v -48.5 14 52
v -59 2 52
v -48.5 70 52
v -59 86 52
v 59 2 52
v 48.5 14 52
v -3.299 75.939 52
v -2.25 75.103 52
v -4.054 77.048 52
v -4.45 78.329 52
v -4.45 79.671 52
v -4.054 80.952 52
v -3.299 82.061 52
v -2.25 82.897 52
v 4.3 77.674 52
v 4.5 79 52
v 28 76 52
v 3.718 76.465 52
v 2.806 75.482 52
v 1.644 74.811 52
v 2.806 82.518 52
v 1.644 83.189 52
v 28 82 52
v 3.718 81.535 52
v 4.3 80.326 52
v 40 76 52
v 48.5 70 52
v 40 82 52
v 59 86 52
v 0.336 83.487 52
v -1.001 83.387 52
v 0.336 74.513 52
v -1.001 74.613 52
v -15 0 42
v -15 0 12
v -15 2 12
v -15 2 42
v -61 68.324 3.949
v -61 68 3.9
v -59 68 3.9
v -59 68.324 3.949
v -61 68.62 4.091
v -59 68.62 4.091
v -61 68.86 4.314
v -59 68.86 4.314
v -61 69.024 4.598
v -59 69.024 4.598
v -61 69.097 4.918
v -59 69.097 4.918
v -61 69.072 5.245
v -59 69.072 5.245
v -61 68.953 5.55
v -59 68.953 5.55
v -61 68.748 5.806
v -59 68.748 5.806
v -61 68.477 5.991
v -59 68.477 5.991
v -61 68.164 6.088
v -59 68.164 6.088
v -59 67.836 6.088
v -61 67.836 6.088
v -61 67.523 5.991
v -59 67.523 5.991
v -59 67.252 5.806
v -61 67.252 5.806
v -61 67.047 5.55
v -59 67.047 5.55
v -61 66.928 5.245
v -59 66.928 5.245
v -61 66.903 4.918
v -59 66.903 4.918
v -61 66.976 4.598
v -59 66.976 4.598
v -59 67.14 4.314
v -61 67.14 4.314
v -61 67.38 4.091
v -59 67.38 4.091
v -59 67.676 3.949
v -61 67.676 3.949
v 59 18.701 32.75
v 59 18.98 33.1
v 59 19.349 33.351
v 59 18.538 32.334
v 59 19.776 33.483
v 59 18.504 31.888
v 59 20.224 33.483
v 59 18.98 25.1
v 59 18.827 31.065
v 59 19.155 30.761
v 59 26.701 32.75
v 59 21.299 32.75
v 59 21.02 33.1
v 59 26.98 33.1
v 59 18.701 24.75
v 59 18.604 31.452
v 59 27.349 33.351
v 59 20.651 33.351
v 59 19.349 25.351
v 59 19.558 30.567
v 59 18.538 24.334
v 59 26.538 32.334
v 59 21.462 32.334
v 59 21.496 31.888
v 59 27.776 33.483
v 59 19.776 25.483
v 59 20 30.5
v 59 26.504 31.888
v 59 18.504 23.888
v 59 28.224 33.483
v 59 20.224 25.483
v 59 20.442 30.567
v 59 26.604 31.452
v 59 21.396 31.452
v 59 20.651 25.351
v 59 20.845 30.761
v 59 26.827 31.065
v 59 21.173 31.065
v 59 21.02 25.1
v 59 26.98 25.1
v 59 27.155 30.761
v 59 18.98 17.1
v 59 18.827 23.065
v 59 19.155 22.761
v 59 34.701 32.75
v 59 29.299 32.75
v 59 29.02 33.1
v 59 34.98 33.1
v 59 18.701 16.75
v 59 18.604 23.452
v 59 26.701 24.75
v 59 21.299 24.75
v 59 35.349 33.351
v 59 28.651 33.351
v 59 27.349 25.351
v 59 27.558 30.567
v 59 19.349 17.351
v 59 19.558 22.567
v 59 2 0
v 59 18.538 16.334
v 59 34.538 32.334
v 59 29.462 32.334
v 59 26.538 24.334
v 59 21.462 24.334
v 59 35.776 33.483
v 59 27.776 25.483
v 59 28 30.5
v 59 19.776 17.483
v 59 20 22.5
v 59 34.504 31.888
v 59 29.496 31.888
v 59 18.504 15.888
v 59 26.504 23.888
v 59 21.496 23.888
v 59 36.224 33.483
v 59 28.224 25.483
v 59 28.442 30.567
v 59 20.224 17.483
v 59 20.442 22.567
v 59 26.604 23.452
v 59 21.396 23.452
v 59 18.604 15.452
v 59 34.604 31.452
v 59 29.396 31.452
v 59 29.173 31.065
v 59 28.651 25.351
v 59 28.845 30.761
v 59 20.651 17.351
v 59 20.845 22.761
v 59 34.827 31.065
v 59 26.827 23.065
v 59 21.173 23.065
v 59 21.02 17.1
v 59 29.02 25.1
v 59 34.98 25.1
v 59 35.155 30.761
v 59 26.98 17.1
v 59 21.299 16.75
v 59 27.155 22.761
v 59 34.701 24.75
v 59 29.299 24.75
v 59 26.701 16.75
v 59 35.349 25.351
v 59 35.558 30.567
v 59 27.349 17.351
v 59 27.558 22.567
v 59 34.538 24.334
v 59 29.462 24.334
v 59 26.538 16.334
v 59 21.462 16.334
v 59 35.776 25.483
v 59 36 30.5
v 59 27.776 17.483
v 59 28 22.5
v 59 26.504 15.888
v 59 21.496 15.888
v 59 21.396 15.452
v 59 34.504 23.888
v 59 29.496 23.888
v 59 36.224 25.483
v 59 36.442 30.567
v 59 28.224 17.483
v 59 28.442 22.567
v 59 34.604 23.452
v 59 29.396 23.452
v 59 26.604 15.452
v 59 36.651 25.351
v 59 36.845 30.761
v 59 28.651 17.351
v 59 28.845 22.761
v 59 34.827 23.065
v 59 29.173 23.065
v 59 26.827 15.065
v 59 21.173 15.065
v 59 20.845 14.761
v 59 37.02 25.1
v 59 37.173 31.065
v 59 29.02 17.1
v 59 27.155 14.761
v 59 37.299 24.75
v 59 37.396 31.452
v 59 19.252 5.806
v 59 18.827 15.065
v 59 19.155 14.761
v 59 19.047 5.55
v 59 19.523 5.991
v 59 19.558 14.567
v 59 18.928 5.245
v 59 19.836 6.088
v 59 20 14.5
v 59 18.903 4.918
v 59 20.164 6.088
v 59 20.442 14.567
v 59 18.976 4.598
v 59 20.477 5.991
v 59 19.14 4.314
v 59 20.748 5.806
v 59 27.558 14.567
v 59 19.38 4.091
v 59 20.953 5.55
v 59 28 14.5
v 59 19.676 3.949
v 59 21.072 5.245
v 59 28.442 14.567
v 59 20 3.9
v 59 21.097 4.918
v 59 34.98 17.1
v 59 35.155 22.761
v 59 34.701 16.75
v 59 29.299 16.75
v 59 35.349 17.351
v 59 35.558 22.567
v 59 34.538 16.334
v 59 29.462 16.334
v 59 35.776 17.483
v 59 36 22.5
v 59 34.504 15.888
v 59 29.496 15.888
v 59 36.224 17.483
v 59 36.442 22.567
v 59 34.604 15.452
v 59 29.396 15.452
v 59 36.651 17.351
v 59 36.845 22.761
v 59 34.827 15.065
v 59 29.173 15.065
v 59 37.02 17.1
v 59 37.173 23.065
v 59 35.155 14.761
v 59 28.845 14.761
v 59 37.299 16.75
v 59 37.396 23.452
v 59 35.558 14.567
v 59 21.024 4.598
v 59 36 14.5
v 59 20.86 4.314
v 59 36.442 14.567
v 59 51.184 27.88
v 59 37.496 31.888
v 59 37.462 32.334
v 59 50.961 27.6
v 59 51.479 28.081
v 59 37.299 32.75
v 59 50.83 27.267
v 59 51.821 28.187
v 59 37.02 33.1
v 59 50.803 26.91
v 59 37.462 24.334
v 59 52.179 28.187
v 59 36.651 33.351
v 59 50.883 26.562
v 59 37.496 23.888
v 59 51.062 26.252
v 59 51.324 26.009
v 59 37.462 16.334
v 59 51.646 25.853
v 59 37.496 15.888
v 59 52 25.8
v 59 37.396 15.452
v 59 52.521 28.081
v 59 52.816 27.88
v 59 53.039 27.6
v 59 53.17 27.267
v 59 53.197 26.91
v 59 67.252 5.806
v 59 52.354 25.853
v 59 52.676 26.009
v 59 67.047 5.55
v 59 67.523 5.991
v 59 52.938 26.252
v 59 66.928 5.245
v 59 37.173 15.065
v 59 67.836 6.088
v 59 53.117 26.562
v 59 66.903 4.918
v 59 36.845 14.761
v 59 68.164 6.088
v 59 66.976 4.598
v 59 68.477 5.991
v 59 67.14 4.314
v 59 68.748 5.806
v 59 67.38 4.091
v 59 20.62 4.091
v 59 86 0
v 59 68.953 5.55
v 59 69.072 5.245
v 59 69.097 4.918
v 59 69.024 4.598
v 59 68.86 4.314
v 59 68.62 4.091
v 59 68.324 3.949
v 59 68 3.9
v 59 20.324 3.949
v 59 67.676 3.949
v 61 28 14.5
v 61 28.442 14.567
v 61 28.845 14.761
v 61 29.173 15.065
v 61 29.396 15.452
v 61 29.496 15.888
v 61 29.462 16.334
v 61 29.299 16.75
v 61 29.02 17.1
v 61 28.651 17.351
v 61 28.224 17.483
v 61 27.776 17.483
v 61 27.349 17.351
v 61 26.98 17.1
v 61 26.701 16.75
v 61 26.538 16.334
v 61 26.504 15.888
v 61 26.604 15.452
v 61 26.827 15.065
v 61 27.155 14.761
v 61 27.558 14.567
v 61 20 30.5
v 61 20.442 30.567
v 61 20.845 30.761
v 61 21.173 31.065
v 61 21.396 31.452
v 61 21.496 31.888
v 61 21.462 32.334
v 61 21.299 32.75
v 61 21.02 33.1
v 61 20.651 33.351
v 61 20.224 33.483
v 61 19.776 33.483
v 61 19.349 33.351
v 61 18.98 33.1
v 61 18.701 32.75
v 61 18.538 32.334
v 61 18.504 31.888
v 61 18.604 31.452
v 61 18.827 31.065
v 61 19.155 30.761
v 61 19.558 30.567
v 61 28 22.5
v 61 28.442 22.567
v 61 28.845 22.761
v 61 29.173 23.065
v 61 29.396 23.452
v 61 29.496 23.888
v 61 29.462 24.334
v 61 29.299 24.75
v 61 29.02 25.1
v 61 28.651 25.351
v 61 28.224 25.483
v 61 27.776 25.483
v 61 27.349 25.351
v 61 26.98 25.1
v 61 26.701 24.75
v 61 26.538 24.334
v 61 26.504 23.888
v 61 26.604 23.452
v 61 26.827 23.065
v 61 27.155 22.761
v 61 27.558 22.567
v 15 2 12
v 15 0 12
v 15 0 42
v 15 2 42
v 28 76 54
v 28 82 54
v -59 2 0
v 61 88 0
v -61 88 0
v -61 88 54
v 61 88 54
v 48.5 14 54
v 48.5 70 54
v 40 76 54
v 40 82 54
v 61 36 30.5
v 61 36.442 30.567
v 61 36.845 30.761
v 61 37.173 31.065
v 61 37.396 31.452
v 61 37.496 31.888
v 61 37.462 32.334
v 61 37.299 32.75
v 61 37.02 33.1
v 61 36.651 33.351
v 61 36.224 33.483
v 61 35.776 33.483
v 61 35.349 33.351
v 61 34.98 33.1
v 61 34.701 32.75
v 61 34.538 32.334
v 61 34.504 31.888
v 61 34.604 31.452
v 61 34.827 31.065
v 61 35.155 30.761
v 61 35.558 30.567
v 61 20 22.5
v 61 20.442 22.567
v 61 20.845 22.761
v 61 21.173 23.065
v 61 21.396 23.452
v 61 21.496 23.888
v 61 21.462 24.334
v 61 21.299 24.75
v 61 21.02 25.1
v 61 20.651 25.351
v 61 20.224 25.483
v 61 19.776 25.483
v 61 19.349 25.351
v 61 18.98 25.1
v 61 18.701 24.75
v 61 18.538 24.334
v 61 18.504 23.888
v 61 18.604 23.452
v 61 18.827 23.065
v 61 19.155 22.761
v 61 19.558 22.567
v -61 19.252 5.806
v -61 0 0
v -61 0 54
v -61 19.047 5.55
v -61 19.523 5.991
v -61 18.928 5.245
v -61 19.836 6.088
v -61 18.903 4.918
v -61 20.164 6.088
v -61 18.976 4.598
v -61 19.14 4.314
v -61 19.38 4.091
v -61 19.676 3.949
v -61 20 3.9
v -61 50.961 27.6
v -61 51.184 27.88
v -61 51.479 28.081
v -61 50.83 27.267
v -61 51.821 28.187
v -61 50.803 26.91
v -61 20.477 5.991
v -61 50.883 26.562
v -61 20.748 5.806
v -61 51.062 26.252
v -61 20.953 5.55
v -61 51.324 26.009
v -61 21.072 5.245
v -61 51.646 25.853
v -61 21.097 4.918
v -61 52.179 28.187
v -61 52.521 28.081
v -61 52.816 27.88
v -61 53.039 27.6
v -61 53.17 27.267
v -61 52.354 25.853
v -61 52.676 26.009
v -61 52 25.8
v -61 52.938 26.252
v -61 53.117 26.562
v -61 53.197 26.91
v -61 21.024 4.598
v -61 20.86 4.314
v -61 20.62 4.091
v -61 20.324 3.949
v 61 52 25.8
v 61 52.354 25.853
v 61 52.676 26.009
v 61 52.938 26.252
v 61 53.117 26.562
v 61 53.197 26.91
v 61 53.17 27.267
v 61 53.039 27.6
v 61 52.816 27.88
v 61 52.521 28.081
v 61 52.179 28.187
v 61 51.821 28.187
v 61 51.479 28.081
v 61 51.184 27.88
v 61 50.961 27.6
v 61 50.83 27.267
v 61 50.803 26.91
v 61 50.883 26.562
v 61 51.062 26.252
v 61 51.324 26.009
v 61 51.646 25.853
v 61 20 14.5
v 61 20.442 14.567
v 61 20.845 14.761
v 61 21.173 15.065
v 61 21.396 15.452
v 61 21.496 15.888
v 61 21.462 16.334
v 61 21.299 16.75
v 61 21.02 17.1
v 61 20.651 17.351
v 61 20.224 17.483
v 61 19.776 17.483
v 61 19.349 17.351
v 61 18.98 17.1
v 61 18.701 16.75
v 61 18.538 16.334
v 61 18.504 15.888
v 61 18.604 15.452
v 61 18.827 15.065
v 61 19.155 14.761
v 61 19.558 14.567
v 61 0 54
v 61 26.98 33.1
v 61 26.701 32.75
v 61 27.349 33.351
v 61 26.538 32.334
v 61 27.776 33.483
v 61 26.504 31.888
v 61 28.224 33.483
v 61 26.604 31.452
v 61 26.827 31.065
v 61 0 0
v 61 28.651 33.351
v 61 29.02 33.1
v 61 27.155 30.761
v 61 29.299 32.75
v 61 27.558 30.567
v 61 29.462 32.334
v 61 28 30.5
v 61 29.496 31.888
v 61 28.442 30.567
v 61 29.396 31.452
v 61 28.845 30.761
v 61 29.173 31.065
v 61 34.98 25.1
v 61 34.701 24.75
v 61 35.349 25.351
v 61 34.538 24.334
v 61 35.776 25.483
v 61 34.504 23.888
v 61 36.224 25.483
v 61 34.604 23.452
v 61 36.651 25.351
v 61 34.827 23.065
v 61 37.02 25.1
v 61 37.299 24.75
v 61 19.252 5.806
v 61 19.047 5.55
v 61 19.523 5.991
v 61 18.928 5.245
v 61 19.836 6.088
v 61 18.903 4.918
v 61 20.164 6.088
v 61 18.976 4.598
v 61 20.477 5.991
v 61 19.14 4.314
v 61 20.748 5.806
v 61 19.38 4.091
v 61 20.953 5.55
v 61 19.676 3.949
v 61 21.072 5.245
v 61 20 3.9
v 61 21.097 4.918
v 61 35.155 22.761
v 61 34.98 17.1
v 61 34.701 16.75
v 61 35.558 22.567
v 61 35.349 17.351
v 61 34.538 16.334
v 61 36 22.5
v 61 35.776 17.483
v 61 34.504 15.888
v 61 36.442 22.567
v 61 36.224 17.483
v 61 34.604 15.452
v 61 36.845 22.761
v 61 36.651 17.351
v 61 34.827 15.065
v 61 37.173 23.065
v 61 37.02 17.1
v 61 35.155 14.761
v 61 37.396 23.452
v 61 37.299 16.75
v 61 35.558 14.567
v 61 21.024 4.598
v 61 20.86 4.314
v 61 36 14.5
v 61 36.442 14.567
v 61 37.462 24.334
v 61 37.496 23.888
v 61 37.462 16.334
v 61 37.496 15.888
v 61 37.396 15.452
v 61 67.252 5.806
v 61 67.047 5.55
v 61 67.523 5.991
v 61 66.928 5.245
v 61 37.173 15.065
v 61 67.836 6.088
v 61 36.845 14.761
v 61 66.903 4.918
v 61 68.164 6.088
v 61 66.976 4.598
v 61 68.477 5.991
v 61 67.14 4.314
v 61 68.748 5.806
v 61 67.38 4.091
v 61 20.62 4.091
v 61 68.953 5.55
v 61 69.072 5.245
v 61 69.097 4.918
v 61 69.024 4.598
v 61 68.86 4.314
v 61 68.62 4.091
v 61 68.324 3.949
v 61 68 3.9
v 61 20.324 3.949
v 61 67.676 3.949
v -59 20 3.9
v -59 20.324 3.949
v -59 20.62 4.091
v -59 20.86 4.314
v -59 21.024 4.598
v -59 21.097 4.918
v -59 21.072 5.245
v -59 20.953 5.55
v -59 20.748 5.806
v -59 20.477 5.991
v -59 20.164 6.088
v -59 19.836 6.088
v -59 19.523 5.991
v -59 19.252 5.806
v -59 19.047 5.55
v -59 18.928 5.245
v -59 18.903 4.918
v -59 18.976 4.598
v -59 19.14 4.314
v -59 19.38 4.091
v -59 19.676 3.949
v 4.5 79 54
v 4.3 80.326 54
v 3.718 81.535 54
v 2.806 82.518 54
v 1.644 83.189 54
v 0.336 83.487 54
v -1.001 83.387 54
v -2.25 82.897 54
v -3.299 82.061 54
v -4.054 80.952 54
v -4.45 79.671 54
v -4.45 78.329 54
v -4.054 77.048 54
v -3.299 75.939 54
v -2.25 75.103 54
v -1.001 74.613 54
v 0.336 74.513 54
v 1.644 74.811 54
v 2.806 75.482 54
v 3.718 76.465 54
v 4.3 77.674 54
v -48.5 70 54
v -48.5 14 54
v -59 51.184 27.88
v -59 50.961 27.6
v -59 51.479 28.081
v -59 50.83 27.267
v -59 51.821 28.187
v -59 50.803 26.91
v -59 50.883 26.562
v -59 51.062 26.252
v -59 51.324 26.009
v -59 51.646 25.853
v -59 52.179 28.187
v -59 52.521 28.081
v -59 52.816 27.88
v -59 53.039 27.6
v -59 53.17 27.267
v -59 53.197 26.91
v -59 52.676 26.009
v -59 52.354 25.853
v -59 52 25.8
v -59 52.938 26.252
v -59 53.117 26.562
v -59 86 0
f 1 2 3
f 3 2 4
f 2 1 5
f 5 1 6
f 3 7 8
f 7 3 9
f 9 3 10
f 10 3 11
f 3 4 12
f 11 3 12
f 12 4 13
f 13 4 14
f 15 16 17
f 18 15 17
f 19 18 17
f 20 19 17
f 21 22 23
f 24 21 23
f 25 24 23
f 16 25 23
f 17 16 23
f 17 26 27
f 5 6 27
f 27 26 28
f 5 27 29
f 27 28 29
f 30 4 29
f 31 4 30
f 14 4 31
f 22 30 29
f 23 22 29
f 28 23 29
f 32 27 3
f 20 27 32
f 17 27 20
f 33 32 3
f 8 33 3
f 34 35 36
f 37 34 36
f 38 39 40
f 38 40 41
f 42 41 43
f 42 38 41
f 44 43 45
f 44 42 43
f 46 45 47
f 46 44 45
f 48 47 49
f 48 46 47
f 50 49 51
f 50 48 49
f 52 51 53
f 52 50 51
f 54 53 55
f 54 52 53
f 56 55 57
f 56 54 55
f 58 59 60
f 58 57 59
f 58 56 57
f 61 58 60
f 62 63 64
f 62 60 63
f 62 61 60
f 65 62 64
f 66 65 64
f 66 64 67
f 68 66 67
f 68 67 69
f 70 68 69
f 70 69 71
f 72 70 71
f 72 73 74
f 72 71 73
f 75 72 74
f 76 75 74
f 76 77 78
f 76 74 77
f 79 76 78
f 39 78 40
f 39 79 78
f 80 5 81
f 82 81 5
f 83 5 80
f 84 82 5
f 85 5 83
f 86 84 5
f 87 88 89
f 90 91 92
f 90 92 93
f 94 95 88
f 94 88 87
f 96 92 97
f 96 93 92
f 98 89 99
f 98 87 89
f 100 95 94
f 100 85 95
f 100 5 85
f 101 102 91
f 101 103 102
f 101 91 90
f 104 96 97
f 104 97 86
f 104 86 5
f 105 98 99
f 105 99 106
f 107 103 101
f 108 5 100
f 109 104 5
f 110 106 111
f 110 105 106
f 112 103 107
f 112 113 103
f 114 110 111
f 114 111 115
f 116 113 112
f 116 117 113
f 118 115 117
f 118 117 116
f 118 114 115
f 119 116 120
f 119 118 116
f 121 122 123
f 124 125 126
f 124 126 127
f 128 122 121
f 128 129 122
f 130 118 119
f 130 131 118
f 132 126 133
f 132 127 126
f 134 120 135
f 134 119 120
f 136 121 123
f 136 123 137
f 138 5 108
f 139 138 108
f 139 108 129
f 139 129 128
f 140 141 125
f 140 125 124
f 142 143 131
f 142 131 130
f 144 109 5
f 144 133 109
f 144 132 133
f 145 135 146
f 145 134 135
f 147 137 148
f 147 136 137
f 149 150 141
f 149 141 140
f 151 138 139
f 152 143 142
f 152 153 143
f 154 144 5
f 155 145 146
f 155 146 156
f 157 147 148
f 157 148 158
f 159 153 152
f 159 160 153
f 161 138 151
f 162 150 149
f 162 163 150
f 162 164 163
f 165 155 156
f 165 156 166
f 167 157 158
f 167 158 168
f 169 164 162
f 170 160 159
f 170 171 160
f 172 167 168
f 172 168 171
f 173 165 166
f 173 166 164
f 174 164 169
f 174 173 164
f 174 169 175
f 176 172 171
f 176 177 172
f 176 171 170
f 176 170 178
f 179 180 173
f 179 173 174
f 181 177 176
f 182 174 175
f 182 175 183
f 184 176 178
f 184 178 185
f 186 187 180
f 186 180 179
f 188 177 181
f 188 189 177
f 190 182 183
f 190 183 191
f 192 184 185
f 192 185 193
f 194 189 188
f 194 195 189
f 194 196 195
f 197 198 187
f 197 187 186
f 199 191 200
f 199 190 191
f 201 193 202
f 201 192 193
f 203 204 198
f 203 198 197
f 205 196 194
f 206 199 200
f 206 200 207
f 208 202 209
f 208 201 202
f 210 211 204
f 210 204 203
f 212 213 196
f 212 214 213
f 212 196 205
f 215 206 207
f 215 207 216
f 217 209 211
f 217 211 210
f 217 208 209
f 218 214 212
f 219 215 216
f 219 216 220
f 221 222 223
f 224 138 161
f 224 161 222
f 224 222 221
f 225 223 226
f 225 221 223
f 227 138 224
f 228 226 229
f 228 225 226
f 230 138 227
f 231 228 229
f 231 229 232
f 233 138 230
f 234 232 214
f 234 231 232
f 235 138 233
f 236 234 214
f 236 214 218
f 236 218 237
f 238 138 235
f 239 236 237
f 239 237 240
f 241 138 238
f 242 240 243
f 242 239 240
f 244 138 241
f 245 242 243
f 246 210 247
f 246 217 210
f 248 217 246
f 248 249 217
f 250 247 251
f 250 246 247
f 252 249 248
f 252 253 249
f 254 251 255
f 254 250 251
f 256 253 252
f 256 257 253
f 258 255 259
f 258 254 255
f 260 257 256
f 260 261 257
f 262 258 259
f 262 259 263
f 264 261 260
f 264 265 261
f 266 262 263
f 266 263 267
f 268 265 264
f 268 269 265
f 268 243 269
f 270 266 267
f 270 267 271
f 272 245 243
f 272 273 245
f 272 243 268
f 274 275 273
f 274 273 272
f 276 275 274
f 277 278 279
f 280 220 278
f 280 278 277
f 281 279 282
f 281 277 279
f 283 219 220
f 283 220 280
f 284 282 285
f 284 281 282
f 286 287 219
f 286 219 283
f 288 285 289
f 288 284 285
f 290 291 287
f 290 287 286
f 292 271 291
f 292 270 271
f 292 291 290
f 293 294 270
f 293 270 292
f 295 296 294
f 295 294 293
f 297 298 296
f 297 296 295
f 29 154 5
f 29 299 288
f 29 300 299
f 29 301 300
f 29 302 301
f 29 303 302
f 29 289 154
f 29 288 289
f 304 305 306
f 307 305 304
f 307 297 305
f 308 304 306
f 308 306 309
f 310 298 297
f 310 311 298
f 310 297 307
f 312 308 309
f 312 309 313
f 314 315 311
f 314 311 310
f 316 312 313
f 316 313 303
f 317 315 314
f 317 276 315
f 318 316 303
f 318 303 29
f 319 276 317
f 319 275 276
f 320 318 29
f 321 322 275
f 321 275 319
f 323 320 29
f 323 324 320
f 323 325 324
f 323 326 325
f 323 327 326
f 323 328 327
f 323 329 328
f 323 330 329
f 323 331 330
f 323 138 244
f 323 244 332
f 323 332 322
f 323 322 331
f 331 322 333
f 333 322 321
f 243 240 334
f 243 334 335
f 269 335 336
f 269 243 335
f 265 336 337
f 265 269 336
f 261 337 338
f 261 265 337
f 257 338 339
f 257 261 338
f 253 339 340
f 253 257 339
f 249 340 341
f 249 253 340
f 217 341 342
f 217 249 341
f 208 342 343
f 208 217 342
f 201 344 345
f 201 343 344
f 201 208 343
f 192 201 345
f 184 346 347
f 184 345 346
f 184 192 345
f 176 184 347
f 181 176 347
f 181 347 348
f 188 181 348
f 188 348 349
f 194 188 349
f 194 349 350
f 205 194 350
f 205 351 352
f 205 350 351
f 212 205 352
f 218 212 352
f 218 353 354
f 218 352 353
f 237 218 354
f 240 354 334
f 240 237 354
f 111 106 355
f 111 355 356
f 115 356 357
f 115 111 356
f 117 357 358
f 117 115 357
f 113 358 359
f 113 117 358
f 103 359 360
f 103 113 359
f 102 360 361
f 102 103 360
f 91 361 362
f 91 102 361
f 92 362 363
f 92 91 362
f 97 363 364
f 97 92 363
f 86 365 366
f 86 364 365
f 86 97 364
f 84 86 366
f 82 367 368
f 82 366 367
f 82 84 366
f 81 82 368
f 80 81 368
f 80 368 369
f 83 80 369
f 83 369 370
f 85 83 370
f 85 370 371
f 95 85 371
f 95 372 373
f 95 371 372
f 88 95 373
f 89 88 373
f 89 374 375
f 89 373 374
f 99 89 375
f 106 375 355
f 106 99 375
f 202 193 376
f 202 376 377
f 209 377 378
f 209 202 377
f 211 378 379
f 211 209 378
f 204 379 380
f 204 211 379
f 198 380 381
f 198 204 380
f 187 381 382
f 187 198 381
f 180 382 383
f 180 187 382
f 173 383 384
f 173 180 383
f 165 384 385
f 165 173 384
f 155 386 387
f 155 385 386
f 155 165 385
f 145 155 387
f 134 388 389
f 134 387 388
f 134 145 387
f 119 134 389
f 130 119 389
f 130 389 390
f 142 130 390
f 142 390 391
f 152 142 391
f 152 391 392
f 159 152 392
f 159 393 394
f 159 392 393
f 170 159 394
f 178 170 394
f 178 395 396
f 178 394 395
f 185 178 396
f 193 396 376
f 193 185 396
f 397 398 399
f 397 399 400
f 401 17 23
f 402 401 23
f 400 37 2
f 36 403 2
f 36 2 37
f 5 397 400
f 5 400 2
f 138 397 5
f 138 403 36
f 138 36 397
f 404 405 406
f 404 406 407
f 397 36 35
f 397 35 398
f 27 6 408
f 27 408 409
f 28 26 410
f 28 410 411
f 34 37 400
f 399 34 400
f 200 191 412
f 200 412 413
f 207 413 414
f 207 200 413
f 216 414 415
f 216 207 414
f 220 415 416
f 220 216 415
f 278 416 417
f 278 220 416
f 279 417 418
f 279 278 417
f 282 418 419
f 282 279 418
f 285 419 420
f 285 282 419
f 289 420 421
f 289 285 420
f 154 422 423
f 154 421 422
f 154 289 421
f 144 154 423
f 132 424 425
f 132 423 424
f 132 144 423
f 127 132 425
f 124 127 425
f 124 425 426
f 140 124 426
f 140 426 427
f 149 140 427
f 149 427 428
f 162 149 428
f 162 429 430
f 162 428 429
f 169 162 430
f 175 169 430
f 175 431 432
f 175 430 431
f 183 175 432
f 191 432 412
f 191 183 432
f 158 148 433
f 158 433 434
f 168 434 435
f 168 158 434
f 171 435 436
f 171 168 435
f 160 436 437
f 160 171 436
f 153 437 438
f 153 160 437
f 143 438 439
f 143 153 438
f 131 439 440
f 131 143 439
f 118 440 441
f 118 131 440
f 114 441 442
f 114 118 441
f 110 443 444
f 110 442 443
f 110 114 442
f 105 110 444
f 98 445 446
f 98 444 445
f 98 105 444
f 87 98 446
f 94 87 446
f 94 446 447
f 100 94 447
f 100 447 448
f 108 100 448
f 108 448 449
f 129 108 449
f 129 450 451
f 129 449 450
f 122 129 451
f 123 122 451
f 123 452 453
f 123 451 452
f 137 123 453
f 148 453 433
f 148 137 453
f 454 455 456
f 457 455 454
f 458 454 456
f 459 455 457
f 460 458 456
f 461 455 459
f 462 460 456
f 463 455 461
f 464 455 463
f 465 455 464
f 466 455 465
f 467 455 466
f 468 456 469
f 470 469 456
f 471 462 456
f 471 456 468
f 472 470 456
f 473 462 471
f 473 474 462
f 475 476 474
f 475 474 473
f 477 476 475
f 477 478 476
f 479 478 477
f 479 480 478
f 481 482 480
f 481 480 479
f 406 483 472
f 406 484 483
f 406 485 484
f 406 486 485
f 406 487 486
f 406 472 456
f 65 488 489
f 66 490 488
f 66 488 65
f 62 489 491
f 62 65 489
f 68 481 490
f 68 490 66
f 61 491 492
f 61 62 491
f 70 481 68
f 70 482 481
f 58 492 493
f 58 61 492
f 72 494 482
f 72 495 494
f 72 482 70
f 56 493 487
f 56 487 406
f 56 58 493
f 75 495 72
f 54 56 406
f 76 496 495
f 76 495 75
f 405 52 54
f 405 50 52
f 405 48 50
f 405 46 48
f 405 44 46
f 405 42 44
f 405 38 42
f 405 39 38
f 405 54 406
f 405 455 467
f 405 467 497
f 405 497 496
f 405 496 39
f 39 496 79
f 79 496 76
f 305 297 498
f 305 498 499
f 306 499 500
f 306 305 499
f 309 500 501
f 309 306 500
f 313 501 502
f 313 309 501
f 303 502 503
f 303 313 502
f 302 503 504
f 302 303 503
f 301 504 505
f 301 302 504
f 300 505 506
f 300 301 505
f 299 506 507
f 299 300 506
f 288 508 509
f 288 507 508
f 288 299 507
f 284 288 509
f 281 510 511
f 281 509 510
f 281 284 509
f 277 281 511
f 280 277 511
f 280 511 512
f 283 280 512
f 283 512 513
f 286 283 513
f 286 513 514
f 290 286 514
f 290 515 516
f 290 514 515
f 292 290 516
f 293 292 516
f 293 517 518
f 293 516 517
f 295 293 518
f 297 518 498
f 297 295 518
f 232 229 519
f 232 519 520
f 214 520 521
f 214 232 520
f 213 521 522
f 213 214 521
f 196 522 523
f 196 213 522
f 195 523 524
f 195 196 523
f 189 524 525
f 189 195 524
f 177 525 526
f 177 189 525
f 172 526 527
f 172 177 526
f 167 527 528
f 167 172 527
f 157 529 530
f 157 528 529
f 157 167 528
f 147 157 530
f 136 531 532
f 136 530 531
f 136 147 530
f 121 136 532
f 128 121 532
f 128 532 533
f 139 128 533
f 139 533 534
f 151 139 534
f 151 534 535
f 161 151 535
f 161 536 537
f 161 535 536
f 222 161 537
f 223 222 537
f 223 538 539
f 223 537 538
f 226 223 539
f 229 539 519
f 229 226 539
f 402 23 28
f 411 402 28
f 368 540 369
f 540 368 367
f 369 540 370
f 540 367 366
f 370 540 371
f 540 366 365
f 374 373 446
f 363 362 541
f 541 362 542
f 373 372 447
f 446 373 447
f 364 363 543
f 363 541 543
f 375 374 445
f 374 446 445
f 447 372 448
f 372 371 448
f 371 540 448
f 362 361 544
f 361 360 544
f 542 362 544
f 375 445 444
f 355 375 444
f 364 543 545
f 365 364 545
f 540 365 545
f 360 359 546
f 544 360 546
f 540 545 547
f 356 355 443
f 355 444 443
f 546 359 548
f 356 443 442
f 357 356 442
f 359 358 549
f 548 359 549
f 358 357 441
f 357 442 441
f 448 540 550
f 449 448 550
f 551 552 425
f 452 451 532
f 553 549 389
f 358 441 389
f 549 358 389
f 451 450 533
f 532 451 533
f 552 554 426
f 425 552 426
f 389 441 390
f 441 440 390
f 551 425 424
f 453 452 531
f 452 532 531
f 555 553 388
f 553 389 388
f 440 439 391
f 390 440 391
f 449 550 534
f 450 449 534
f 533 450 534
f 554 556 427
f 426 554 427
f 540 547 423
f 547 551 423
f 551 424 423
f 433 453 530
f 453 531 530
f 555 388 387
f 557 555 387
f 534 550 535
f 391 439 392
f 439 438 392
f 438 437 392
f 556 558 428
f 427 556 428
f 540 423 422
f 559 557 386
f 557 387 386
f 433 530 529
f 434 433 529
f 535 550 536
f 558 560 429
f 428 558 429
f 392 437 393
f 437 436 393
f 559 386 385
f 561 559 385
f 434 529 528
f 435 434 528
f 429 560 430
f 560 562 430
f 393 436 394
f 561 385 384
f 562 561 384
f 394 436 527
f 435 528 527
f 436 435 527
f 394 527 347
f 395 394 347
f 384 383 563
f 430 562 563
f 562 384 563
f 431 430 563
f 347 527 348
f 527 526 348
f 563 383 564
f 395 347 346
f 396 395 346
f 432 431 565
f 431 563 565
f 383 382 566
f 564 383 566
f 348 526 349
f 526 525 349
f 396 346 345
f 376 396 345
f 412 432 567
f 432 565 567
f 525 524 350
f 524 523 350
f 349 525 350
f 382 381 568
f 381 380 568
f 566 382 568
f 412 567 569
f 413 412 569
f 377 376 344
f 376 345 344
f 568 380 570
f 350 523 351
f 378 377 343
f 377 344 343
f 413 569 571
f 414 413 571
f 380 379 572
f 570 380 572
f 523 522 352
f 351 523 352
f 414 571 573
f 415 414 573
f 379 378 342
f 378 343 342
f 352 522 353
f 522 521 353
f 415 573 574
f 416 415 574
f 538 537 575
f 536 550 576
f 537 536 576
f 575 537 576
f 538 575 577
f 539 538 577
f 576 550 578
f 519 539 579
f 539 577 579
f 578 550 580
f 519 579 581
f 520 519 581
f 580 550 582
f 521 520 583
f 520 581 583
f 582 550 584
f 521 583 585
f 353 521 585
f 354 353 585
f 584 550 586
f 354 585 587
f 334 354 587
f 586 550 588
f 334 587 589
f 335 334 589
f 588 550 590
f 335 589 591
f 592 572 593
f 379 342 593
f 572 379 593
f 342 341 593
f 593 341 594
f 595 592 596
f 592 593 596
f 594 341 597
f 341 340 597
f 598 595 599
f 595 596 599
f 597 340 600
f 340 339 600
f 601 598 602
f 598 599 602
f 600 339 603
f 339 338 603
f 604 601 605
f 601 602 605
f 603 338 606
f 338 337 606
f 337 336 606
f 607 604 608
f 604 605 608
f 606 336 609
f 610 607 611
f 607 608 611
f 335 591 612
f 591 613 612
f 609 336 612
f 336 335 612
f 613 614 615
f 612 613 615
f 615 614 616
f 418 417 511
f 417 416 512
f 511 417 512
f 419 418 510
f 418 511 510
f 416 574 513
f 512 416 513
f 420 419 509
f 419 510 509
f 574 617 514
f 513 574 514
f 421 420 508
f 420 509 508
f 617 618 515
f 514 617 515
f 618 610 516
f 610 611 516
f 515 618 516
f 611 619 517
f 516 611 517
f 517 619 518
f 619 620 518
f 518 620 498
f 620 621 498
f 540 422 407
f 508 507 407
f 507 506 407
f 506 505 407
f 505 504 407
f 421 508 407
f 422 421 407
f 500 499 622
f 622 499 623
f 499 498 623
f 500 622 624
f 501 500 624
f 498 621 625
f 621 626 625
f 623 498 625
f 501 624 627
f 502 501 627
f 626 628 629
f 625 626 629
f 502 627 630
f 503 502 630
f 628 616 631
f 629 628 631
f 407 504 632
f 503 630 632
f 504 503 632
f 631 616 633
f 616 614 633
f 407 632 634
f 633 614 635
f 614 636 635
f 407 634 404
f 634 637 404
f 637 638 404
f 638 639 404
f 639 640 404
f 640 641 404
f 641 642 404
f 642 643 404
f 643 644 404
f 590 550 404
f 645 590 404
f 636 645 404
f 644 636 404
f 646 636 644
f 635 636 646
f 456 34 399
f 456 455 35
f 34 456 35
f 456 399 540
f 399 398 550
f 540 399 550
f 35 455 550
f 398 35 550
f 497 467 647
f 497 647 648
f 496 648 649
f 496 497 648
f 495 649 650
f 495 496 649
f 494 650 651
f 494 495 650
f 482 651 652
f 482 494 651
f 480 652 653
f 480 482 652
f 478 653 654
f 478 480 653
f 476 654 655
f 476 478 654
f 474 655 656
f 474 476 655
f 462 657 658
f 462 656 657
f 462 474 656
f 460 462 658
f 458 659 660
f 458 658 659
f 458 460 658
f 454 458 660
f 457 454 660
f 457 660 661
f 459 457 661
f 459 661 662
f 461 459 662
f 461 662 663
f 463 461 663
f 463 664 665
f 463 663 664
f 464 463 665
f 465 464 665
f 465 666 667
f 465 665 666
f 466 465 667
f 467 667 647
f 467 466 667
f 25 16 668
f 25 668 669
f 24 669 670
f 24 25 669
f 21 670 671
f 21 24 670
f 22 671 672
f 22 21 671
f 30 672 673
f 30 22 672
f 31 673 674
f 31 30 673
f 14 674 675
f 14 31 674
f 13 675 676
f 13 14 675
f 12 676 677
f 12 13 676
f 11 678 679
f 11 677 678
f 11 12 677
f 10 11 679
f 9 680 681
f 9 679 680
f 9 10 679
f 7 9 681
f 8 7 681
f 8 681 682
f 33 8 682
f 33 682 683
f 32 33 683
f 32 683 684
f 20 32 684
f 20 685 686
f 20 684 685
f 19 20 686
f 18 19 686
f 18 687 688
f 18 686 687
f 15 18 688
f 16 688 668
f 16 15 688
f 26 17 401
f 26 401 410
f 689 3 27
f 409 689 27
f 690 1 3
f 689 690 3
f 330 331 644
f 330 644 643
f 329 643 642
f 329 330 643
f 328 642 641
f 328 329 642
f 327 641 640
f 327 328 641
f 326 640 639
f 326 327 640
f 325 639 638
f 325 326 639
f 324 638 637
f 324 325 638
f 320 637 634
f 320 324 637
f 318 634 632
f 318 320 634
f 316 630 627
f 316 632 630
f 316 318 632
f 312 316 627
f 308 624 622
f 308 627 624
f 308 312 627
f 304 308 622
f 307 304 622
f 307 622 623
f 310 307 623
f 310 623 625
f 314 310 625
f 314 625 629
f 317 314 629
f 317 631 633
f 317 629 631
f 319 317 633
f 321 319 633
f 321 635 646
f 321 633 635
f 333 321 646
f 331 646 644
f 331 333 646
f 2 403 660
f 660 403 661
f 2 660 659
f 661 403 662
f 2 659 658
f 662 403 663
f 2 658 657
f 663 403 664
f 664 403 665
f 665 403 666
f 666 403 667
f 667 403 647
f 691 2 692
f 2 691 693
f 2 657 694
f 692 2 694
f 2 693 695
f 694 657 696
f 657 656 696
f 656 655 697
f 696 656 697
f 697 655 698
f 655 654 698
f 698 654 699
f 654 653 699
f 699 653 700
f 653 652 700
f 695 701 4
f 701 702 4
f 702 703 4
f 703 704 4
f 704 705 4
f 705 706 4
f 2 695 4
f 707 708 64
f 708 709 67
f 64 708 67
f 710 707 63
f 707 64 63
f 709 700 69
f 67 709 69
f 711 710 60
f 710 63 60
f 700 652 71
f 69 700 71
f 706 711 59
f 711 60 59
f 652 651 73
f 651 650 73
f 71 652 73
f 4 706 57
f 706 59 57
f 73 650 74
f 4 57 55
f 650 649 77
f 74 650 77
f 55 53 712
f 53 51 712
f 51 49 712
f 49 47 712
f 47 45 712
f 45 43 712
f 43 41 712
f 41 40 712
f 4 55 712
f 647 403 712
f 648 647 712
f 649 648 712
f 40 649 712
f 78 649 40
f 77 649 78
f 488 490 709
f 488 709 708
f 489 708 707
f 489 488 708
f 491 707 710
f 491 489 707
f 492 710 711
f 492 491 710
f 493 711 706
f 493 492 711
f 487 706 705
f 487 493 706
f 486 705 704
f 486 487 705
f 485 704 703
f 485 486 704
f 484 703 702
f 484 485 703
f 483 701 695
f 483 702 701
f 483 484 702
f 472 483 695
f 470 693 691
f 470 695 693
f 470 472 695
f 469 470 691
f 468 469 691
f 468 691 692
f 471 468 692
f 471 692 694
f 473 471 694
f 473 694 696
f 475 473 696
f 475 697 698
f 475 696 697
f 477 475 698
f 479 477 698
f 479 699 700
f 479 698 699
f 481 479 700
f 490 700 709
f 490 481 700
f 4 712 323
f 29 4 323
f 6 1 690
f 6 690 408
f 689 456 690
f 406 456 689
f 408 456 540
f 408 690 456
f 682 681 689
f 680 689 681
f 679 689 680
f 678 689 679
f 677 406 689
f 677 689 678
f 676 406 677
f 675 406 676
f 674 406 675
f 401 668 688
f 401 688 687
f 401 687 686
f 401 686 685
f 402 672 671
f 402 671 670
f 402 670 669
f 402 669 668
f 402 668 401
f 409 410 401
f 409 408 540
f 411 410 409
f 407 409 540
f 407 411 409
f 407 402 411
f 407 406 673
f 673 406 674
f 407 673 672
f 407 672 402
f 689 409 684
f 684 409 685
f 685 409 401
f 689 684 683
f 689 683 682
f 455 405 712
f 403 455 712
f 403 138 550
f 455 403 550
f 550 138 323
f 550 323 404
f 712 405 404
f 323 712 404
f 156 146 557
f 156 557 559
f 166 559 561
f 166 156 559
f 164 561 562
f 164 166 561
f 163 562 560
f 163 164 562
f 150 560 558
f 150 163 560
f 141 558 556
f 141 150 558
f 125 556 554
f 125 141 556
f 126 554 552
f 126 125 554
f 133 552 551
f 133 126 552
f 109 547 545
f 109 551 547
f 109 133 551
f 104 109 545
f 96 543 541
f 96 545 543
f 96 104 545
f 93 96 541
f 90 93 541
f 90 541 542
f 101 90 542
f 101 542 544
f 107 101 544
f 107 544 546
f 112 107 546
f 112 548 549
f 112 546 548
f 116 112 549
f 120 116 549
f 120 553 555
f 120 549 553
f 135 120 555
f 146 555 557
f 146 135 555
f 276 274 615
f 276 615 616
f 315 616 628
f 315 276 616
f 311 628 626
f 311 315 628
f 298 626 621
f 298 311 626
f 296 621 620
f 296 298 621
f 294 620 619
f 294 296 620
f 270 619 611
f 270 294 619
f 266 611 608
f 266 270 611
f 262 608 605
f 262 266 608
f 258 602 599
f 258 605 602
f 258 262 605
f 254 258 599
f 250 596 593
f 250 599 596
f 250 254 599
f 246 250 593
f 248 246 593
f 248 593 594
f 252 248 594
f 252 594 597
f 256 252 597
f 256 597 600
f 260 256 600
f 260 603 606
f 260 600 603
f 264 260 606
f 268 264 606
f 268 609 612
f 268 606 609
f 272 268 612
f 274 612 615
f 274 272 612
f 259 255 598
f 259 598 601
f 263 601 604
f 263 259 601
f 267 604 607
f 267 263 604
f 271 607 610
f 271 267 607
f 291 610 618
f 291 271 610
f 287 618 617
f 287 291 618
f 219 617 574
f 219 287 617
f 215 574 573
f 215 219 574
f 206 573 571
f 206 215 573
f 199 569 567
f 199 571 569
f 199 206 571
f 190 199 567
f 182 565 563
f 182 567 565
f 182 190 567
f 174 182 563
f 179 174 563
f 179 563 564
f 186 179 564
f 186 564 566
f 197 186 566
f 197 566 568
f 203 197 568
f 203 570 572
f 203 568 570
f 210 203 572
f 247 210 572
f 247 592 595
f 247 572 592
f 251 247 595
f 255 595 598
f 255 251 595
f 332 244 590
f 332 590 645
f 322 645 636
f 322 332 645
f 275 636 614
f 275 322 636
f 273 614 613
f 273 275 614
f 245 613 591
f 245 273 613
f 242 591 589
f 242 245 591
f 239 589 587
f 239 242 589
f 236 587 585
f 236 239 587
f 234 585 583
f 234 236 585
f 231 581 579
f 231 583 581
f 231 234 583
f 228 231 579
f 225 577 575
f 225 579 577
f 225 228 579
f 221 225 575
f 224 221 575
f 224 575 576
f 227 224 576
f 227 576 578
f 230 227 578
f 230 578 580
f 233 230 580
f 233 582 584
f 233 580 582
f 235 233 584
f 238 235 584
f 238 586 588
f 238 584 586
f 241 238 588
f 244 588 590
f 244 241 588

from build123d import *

# Parameters (mm, degrees)
SKETCH1_W            = 122
SKETCH1_H            = 88
BOSS_EXTRUDE1_DEPTH  = 54
BOSS_EXTRUDE2_START  = -1
SKETCH2_W            = 118
SKETCH2_H            = 84
BOSS_EXTRUDE2_DEPTH  = 53
BOSS_EXTRUDE3_START  = 50
SKETCH3_W            = 97
SKETCH3_H            = 56
BOSS_EXTRUDE3_DEPTH  = 10
BOSS_EXTRUDE4_START  = 50
SKETCH4_R            = 4.5
BOSS_EXTRUDE4_DEPTH  = 10
BOSS_EXTRUDE5_START  = 50
SKETCH5_W            = 12
SKETCH5_H            = 6
BOSS_EXTRUDE5_DEPTH  = 10
BOSS_EXTRUDE6_START  = -65
SKETCH6_R            = 1.2
BOSS_EXTRUDE6_DEPTH  = 130
BOSS_EXTRUDE7_START  = 55
SKETCH7_R            = 1.5
BOSS_EXTRUDE7_DEPTH  = 10
BOSS_EXTRUDE8_START  = 55
SKETCH8_R            = 1.5
BOSS_EXTRUDE8_DEPTH  = 10
BOSS_EXTRUDE9_START  = 55
SKETCH9_R            = 1.5
BOSS_EXTRUDE9_DEPTH  = 10
BOSS_EXTRUDE10_START = 55
SKETCH10_R           = 1.5
BOSS_EXTRUDE10_DEPTH = 10
BOSS_EXTRUDE11_START = 55
SKETCH11_R           = 1.5
BOSS_EXTRUDE11_DEPTH = 10
BOSS_EXTRUDE12_START = 55
SKETCH12_R           = 1.5
BOSS_EXTRUDE12_DEPTH = 10
BOSS_EXTRUDE13_START = 55
SKETCH13_R           = 1.5
BOSS_EXTRUDE13_DEPTH = 10
BOSS_EXTRUDE14_START = 55
SKETCH14_R           = 1.5
BOSS_EXTRUDE14_DEPTH = 10
BOSS_EXTRUDE15_START = 55
SKETCH15_R           = 1.5
BOSS_EXTRUDE15_DEPTH = 10
BOSS_EXTRUDE16_START = 12
SKETCH16_W           = 30
SKETCH16_H           = 4
BOSS_EXTRUDE16_DEPTH = 30
BOSS_EXTRUDE17_START = -65
SKETCH17_R           = 1.1
BOSS_EXTRUDE17_DEPTH = 130
BOSS_EXTRUDE18_START = -65
SKETCH18_R           = 1.1
BOSS_EXTRUDE18_DEPTH = 130


with BuildPart() as part:
    # Sketch1 → Boss-Extrude1 (new body)
    with BuildSketch(Plane.XY):
        with Locations((0, 44)):
            Rectangle(SKETCH1_W, SKETCH1_H)
    extrude(amount=BOSS_EXTRUDE1_DEPTH)


with BuildPart() as body_2:
    # Sketch2 → Boss-Extrude2 (new body)
    with BuildSketch(Plane.XY.offset(BOSS_EXTRUDE2_START)):
        with Locations((0, 44)):
            Rectangle(SKETCH2_W, SKETCH2_H)
    extrude(amount=BOSS_EXTRUDE2_DEPTH)


with BuildPart() as part_1:
    add(part.part)

    # Combine1: cut body 2
    add(body_2.part, mode=Mode.SUBTRACT)


with BuildPart() as body_2_2:
    # Sketch3 → Boss-Extrude3 (new body)
    with BuildSketch(Plane.XY.offset(BOSS_EXTRUDE3_START)):
        with Locations((0, 42)):
            Rectangle(SKETCH3_W, SKETCH3_H)
    extrude(amount=BOSS_EXTRUDE3_DEPTH)


with BuildPart() as part_2:
    add(part_1.part)

    # Combine2: cut body 2 2
    add(body_2_2.part, mode=Mode.SUBTRACT)


with BuildPart() as body_2_3:
    # Sketch4 → Boss-Extrude4 (new body)
    with BuildSketch(Plane.XY.offset(BOSS_EXTRUDE4_START)):
        with Locations((0, 79)):
            Circle(SKETCH4_R)
    extrude(amount=BOSS_EXTRUDE4_DEPTH)


with BuildPart() as part_3:
    add(part_2.part)

    # Combine3: cut body 2 3
    add(body_2_3.part, mode=Mode.SUBTRACT)


with BuildPart() as body_2_4:
    # Sketch5 → Boss-Extrude5 (new body)
    with BuildSketch(Plane.XY.offset(BOSS_EXTRUDE5_START)):
        with Locations((34, 79)):
            Rectangle(SKETCH5_W, SKETCH5_H)
    extrude(amount=BOSS_EXTRUDE5_DEPTH)


with BuildPart() as part_4:
    add(part_3.part)

    # Combine4: cut body 2 4
    add(body_2_4.part, mode=Mode.SUBTRACT)


with BuildPart() as body_2_5:
    # Sketch6 → Boss-Extrude6 (new body)
    with BuildSketch(Plane(origin=(0, 0, 0), x_dir=(0, 0, -1), z_dir=(1, 0, 0)).offset(BOSS_EXTRUDE6_START)):
        with Locations((-27, 52)):
            Circle(SKETCH6_R)
    extrude(amount=BOSS_EXTRUDE6_DEPTH)


with BuildPart() as part_5:
    add(part_4.part)

    # Combine5: cut body 2 5
    add(body_2_5.part, mode=Mode.SUBTRACT)


with BuildPart() as body_2_6:
    # Sketch7 → Boss-Extrude7 (new body)
    with BuildSketch(Plane(origin=(0, 0, 0), x_dir=(0, 0, -1), z_dir=(1, 0, 0)).offset(BOSS_EXTRUDE7_START)):
        with Locations((-16, 20)):
            Circle(SKETCH7_R)
    extrude(amount=BOSS_EXTRUDE7_DEPTH)


with BuildPart() as part_6:
    add(part_5.part)

    # Combine6: cut body 2 6
    add(body_2_6.part, mode=Mode.SUBTRACT)


with BuildPart() as body_2_7:
    # Sketch8 → Boss-Extrude8 (new body)
    with BuildSketch(Plane(origin=(0, 0, 0), x_dir=(0, 0, -1), z_dir=(1, 0, 0)).offset(BOSS_EXTRUDE8_START)):
        with Locations((-24, 20)):
            Circle(SKETCH8_R)
    extrude(amount=BOSS_EXTRUDE8_DEPTH)


with BuildPart() as part_7:
    add(part_6.part)

    # Combine7: cut body 2 7
    add(body_2_7.part, mode=Mode.SUBTRACT)


with BuildPart() as body_2_8:
    # Sketch9 → Boss-Extrude9 (new body)
    with BuildSketch(Plane(origin=(0, 0, 0), x_dir=(0, 0, -1), z_dir=(1, 0, 0)).offset(BOSS_EXTRUDE9_START)):
        with Locations((-32, 20)):
            Circle(SKETCH9_R)
    extrude(amount=BOSS_EXTRUDE9_DEPTH)


with BuildPart() as part_8:
    add(part_7.part)

    # Combine8: cut body 2 8
    add(body_2_8.part, mode=Mode.SUBTRACT)


with BuildPart() as body_2_9:
    # Sketch10 → Boss-Extrude10 (new body)
    with BuildSketch(Plane(origin=(0, 0, 0), x_dir=(0, 0, -1), z_dir=(1, 0, 0)).offset(BOSS_EXTRUDE10_START)):
        with Locations((-16, 28)):
            Circle(SKETCH10_R)
    extrude(amount=BOSS_EXTRUDE10_DEPTH)


with BuildPart() as part_9:
    add(part_8.part)

    # Combine9: cut body 2 9
    add(body_2_9.part, mode=Mode.SUBTRACT)


with BuildPart() as body_2_10:
    # Sketch11 → Boss-Extrude11 (new body)
    with BuildSketch(Plane(origin=(0, 0, 0), x_dir=(0, 0, -1), z_dir=(1, 0, 0)).offset(BOSS_EXTRUDE11_START)):
        with Locations((-24, 28)):
            Circle(SKETCH11_R)
    extrude(amount=BOSS_EXTRUDE11_DEPTH)


with BuildPart() as part_10:
    add(part_9.part)

    # Combine10: cut body 2 10
    add(body_2_10.part, mode=Mode.SUBTRACT)


with BuildPart() as body_2_11:
    # Sketch12 → Boss-Extrude12 (new body)
    with BuildSketch(Plane(origin=(0, 0, 0), x_dir=(0, 0, -1), z_dir=(1, 0, 0)).offset(BOSS_EXTRUDE12_START)):
        with Locations((-32, 28)):
            Circle(SKETCH12_R)
    extrude(amount=BOSS_EXTRUDE12_DEPTH)


with BuildPart() as part_11:
    add(part_10.part)

    # Combine11: cut body 2 11
    add(body_2_11.part, mode=Mode.SUBTRACT)


with BuildPart() as body_2_12:
    # Sketch13 → Boss-Extrude13 (new body)
    with BuildSketch(Plane(origin=(0, 0, 0), x_dir=(0, 0, -1), z_dir=(1, 0, 0)).offset(BOSS_EXTRUDE13_START)):
        with Locations((-16, 36)):
            Circle(SKETCH13_R)
    extrude(amount=BOSS_EXTRUDE13_DEPTH)


with BuildPart() as part_12:
    add(part_11.part)

    # Combine12: cut body 2 12
    add(body_2_12.part, mode=Mode.SUBTRACT)


with BuildPart() as body_2_13:
    # Sketch14 → Boss-Extrude14 (new body)
    with BuildSketch(Plane(origin=(0, 0, 0), x_dir=(0, 0, -1), z_dir=(1, 0, 0)).offset(BOSS_EXTRUDE14_START)):
        with Locations((-24, 36)):
            Circle(SKETCH14_R)
    extrude(amount=BOSS_EXTRUDE14_DEPTH)


with BuildPart() as part_13:
    add(part_12.part)

    # Combine13: cut body 2 13
    add(body_2_13.part, mode=Mode.SUBTRACT)


with BuildPart() as body_2_14:
    # Sketch15 → Boss-Extrude15 (new body)
    with BuildSketch(Plane(origin=(0, 0, 0), x_dir=(0, 0, -1), z_dir=(1, 0, 0)).offset(BOSS_EXTRUDE15_START)):
        with Locations((-32, 36)):
            Circle(SKETCH15_R)
    extrude(amount=BOSS_EXTRUDE15_DEPTH)


with BuildPart() as part_14:
    add(part_13.part)

    # Combine14: cut body 2 14
    add(body_2_14.part, mode=Mode.SUBTRACT)


with BuildPart() as body_2_15:
    # Sketch16 → Boss-Extrude16 (new body)
    with BuildSketch(Plane.XY.offset(BOSS_EXTRUDE16_START)):
        with Locations((0, 1)):
            Rectangle(SKETCH16_W, SKETCH16_H)
    extrude(amount=BOSS_EXTRUDE16_DEPTH)


with BuildPart() as part_15:
    add(part_14.part)

    # Combine15: cut body 2 15
    add(body_2_15.part, mode=Mode.SUBTRACT)


with BuildPart() as body_2_16:
    # Sketch17 → Boss-Extrude17 (new body)
    with BuildSketch(Plane(origin=(0, 0, 0), x_dir=(0, 0, -1), z_dir=(1, 0, 0)).offset(BOSS_EXTRUDE17_START)):
        with Locations((-5, 20)):
            Circle(SKETCH17_R)
    extrude(amount=BOSS_EXTRUDE17_DEPTH)


with BuildPart() as part_16:
    add(part_15.part)

    # Combine16: cut body 2 16
    add(body_2_16.part, mode=Mode.SUBTRACT)


with BuildPart() as body_2_17:
    # Sketch18 → Boss-Extrude18 (new body)
    with BuildSketch(Plane(origin=(0, 0, 0), x_dir=(0, 0, -1), z_dir=(1, 0, 0)).offset(BOSS_EXTRUDE18_START)):
        with Locations((-5, 68)):
            Circle(SKETCH18_R)
    extrude(amount=BOSS_EXTRUDE18_DEPTH)


with BuildPart() as part_17:
    add(part_16.part)

    # Combine17: cut body 2 17
    add(body_2_17.part, mode=Mode.SUBTRACT)


solid = part_17.part
